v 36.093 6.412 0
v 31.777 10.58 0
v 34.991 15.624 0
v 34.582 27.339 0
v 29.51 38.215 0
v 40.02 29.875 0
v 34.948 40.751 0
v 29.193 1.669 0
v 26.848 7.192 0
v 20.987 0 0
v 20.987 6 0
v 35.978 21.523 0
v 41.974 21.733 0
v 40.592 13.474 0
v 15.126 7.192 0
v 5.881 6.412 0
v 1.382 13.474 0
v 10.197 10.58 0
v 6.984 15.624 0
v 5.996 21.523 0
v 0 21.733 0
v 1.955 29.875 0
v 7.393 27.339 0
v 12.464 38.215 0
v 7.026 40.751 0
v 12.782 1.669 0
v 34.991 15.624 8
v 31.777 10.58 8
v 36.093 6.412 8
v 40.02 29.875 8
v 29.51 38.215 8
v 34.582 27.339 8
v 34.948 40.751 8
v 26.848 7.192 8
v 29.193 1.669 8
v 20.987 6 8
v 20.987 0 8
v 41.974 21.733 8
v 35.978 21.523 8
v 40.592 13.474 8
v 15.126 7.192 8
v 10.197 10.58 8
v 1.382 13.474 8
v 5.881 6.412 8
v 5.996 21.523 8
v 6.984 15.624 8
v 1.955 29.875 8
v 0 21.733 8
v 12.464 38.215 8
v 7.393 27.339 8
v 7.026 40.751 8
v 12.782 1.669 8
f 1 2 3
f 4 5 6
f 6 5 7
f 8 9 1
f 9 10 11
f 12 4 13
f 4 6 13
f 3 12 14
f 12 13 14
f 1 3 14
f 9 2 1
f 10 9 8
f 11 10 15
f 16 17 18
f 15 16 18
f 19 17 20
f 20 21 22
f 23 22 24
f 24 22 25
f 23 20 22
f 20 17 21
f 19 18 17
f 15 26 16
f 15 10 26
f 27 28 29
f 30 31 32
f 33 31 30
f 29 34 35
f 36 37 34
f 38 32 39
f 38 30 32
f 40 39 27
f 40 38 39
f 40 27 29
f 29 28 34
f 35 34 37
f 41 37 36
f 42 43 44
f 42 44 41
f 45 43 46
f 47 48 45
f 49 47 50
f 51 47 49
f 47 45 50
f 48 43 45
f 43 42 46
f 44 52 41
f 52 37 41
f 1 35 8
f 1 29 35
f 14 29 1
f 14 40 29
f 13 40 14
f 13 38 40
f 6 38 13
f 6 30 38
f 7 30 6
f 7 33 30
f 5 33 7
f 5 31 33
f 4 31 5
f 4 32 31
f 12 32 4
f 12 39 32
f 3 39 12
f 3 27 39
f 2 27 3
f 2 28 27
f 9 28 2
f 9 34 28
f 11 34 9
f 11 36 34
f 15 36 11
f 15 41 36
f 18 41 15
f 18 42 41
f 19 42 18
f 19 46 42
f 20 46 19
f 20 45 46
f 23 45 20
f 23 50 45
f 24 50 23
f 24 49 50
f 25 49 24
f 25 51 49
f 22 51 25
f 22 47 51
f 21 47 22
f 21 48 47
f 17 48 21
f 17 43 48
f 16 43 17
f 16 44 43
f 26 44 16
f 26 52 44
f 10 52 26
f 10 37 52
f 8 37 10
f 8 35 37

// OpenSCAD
$fn = 32;

// ----------------------------------------------------------------------
// Clip blank: omega clip, 8 mm thick
// ----------------------------------------------------------------------

// --- parameters (mm) ---
profile_height = 8;       // extrusion height
profile_points = 26;      // points of the closed outline

profile = [[1.955, 29.875], [0, 21.733], [1.382, 13.474], [5.881, 6.412], [12.782, 1.669], [20.987, 0], [29.193, 1.669], [36.093, 6.412], [40.592, 13.474], [41.974, 21.733], [40.02, 29.875], [34.948, 40.751], [29.51, 38.215], [34.582, 27.339], [35.978, 21.523], [34.991, 15.624], [31.777, 10.58], [26.848, 7.192], [20.987, 6], [15.126, 7.192], [10.197, 10.58], [6.984, 15.624], [5.996, 21.523], [7.393, 27.339], [12.464, 38.215], [7.026, 40.751]];  // single closed polygon, 26 points, counter clockwise

// --- the one profile operation ---
linear_extrude(height = profile_height) polygon(points = profile);
